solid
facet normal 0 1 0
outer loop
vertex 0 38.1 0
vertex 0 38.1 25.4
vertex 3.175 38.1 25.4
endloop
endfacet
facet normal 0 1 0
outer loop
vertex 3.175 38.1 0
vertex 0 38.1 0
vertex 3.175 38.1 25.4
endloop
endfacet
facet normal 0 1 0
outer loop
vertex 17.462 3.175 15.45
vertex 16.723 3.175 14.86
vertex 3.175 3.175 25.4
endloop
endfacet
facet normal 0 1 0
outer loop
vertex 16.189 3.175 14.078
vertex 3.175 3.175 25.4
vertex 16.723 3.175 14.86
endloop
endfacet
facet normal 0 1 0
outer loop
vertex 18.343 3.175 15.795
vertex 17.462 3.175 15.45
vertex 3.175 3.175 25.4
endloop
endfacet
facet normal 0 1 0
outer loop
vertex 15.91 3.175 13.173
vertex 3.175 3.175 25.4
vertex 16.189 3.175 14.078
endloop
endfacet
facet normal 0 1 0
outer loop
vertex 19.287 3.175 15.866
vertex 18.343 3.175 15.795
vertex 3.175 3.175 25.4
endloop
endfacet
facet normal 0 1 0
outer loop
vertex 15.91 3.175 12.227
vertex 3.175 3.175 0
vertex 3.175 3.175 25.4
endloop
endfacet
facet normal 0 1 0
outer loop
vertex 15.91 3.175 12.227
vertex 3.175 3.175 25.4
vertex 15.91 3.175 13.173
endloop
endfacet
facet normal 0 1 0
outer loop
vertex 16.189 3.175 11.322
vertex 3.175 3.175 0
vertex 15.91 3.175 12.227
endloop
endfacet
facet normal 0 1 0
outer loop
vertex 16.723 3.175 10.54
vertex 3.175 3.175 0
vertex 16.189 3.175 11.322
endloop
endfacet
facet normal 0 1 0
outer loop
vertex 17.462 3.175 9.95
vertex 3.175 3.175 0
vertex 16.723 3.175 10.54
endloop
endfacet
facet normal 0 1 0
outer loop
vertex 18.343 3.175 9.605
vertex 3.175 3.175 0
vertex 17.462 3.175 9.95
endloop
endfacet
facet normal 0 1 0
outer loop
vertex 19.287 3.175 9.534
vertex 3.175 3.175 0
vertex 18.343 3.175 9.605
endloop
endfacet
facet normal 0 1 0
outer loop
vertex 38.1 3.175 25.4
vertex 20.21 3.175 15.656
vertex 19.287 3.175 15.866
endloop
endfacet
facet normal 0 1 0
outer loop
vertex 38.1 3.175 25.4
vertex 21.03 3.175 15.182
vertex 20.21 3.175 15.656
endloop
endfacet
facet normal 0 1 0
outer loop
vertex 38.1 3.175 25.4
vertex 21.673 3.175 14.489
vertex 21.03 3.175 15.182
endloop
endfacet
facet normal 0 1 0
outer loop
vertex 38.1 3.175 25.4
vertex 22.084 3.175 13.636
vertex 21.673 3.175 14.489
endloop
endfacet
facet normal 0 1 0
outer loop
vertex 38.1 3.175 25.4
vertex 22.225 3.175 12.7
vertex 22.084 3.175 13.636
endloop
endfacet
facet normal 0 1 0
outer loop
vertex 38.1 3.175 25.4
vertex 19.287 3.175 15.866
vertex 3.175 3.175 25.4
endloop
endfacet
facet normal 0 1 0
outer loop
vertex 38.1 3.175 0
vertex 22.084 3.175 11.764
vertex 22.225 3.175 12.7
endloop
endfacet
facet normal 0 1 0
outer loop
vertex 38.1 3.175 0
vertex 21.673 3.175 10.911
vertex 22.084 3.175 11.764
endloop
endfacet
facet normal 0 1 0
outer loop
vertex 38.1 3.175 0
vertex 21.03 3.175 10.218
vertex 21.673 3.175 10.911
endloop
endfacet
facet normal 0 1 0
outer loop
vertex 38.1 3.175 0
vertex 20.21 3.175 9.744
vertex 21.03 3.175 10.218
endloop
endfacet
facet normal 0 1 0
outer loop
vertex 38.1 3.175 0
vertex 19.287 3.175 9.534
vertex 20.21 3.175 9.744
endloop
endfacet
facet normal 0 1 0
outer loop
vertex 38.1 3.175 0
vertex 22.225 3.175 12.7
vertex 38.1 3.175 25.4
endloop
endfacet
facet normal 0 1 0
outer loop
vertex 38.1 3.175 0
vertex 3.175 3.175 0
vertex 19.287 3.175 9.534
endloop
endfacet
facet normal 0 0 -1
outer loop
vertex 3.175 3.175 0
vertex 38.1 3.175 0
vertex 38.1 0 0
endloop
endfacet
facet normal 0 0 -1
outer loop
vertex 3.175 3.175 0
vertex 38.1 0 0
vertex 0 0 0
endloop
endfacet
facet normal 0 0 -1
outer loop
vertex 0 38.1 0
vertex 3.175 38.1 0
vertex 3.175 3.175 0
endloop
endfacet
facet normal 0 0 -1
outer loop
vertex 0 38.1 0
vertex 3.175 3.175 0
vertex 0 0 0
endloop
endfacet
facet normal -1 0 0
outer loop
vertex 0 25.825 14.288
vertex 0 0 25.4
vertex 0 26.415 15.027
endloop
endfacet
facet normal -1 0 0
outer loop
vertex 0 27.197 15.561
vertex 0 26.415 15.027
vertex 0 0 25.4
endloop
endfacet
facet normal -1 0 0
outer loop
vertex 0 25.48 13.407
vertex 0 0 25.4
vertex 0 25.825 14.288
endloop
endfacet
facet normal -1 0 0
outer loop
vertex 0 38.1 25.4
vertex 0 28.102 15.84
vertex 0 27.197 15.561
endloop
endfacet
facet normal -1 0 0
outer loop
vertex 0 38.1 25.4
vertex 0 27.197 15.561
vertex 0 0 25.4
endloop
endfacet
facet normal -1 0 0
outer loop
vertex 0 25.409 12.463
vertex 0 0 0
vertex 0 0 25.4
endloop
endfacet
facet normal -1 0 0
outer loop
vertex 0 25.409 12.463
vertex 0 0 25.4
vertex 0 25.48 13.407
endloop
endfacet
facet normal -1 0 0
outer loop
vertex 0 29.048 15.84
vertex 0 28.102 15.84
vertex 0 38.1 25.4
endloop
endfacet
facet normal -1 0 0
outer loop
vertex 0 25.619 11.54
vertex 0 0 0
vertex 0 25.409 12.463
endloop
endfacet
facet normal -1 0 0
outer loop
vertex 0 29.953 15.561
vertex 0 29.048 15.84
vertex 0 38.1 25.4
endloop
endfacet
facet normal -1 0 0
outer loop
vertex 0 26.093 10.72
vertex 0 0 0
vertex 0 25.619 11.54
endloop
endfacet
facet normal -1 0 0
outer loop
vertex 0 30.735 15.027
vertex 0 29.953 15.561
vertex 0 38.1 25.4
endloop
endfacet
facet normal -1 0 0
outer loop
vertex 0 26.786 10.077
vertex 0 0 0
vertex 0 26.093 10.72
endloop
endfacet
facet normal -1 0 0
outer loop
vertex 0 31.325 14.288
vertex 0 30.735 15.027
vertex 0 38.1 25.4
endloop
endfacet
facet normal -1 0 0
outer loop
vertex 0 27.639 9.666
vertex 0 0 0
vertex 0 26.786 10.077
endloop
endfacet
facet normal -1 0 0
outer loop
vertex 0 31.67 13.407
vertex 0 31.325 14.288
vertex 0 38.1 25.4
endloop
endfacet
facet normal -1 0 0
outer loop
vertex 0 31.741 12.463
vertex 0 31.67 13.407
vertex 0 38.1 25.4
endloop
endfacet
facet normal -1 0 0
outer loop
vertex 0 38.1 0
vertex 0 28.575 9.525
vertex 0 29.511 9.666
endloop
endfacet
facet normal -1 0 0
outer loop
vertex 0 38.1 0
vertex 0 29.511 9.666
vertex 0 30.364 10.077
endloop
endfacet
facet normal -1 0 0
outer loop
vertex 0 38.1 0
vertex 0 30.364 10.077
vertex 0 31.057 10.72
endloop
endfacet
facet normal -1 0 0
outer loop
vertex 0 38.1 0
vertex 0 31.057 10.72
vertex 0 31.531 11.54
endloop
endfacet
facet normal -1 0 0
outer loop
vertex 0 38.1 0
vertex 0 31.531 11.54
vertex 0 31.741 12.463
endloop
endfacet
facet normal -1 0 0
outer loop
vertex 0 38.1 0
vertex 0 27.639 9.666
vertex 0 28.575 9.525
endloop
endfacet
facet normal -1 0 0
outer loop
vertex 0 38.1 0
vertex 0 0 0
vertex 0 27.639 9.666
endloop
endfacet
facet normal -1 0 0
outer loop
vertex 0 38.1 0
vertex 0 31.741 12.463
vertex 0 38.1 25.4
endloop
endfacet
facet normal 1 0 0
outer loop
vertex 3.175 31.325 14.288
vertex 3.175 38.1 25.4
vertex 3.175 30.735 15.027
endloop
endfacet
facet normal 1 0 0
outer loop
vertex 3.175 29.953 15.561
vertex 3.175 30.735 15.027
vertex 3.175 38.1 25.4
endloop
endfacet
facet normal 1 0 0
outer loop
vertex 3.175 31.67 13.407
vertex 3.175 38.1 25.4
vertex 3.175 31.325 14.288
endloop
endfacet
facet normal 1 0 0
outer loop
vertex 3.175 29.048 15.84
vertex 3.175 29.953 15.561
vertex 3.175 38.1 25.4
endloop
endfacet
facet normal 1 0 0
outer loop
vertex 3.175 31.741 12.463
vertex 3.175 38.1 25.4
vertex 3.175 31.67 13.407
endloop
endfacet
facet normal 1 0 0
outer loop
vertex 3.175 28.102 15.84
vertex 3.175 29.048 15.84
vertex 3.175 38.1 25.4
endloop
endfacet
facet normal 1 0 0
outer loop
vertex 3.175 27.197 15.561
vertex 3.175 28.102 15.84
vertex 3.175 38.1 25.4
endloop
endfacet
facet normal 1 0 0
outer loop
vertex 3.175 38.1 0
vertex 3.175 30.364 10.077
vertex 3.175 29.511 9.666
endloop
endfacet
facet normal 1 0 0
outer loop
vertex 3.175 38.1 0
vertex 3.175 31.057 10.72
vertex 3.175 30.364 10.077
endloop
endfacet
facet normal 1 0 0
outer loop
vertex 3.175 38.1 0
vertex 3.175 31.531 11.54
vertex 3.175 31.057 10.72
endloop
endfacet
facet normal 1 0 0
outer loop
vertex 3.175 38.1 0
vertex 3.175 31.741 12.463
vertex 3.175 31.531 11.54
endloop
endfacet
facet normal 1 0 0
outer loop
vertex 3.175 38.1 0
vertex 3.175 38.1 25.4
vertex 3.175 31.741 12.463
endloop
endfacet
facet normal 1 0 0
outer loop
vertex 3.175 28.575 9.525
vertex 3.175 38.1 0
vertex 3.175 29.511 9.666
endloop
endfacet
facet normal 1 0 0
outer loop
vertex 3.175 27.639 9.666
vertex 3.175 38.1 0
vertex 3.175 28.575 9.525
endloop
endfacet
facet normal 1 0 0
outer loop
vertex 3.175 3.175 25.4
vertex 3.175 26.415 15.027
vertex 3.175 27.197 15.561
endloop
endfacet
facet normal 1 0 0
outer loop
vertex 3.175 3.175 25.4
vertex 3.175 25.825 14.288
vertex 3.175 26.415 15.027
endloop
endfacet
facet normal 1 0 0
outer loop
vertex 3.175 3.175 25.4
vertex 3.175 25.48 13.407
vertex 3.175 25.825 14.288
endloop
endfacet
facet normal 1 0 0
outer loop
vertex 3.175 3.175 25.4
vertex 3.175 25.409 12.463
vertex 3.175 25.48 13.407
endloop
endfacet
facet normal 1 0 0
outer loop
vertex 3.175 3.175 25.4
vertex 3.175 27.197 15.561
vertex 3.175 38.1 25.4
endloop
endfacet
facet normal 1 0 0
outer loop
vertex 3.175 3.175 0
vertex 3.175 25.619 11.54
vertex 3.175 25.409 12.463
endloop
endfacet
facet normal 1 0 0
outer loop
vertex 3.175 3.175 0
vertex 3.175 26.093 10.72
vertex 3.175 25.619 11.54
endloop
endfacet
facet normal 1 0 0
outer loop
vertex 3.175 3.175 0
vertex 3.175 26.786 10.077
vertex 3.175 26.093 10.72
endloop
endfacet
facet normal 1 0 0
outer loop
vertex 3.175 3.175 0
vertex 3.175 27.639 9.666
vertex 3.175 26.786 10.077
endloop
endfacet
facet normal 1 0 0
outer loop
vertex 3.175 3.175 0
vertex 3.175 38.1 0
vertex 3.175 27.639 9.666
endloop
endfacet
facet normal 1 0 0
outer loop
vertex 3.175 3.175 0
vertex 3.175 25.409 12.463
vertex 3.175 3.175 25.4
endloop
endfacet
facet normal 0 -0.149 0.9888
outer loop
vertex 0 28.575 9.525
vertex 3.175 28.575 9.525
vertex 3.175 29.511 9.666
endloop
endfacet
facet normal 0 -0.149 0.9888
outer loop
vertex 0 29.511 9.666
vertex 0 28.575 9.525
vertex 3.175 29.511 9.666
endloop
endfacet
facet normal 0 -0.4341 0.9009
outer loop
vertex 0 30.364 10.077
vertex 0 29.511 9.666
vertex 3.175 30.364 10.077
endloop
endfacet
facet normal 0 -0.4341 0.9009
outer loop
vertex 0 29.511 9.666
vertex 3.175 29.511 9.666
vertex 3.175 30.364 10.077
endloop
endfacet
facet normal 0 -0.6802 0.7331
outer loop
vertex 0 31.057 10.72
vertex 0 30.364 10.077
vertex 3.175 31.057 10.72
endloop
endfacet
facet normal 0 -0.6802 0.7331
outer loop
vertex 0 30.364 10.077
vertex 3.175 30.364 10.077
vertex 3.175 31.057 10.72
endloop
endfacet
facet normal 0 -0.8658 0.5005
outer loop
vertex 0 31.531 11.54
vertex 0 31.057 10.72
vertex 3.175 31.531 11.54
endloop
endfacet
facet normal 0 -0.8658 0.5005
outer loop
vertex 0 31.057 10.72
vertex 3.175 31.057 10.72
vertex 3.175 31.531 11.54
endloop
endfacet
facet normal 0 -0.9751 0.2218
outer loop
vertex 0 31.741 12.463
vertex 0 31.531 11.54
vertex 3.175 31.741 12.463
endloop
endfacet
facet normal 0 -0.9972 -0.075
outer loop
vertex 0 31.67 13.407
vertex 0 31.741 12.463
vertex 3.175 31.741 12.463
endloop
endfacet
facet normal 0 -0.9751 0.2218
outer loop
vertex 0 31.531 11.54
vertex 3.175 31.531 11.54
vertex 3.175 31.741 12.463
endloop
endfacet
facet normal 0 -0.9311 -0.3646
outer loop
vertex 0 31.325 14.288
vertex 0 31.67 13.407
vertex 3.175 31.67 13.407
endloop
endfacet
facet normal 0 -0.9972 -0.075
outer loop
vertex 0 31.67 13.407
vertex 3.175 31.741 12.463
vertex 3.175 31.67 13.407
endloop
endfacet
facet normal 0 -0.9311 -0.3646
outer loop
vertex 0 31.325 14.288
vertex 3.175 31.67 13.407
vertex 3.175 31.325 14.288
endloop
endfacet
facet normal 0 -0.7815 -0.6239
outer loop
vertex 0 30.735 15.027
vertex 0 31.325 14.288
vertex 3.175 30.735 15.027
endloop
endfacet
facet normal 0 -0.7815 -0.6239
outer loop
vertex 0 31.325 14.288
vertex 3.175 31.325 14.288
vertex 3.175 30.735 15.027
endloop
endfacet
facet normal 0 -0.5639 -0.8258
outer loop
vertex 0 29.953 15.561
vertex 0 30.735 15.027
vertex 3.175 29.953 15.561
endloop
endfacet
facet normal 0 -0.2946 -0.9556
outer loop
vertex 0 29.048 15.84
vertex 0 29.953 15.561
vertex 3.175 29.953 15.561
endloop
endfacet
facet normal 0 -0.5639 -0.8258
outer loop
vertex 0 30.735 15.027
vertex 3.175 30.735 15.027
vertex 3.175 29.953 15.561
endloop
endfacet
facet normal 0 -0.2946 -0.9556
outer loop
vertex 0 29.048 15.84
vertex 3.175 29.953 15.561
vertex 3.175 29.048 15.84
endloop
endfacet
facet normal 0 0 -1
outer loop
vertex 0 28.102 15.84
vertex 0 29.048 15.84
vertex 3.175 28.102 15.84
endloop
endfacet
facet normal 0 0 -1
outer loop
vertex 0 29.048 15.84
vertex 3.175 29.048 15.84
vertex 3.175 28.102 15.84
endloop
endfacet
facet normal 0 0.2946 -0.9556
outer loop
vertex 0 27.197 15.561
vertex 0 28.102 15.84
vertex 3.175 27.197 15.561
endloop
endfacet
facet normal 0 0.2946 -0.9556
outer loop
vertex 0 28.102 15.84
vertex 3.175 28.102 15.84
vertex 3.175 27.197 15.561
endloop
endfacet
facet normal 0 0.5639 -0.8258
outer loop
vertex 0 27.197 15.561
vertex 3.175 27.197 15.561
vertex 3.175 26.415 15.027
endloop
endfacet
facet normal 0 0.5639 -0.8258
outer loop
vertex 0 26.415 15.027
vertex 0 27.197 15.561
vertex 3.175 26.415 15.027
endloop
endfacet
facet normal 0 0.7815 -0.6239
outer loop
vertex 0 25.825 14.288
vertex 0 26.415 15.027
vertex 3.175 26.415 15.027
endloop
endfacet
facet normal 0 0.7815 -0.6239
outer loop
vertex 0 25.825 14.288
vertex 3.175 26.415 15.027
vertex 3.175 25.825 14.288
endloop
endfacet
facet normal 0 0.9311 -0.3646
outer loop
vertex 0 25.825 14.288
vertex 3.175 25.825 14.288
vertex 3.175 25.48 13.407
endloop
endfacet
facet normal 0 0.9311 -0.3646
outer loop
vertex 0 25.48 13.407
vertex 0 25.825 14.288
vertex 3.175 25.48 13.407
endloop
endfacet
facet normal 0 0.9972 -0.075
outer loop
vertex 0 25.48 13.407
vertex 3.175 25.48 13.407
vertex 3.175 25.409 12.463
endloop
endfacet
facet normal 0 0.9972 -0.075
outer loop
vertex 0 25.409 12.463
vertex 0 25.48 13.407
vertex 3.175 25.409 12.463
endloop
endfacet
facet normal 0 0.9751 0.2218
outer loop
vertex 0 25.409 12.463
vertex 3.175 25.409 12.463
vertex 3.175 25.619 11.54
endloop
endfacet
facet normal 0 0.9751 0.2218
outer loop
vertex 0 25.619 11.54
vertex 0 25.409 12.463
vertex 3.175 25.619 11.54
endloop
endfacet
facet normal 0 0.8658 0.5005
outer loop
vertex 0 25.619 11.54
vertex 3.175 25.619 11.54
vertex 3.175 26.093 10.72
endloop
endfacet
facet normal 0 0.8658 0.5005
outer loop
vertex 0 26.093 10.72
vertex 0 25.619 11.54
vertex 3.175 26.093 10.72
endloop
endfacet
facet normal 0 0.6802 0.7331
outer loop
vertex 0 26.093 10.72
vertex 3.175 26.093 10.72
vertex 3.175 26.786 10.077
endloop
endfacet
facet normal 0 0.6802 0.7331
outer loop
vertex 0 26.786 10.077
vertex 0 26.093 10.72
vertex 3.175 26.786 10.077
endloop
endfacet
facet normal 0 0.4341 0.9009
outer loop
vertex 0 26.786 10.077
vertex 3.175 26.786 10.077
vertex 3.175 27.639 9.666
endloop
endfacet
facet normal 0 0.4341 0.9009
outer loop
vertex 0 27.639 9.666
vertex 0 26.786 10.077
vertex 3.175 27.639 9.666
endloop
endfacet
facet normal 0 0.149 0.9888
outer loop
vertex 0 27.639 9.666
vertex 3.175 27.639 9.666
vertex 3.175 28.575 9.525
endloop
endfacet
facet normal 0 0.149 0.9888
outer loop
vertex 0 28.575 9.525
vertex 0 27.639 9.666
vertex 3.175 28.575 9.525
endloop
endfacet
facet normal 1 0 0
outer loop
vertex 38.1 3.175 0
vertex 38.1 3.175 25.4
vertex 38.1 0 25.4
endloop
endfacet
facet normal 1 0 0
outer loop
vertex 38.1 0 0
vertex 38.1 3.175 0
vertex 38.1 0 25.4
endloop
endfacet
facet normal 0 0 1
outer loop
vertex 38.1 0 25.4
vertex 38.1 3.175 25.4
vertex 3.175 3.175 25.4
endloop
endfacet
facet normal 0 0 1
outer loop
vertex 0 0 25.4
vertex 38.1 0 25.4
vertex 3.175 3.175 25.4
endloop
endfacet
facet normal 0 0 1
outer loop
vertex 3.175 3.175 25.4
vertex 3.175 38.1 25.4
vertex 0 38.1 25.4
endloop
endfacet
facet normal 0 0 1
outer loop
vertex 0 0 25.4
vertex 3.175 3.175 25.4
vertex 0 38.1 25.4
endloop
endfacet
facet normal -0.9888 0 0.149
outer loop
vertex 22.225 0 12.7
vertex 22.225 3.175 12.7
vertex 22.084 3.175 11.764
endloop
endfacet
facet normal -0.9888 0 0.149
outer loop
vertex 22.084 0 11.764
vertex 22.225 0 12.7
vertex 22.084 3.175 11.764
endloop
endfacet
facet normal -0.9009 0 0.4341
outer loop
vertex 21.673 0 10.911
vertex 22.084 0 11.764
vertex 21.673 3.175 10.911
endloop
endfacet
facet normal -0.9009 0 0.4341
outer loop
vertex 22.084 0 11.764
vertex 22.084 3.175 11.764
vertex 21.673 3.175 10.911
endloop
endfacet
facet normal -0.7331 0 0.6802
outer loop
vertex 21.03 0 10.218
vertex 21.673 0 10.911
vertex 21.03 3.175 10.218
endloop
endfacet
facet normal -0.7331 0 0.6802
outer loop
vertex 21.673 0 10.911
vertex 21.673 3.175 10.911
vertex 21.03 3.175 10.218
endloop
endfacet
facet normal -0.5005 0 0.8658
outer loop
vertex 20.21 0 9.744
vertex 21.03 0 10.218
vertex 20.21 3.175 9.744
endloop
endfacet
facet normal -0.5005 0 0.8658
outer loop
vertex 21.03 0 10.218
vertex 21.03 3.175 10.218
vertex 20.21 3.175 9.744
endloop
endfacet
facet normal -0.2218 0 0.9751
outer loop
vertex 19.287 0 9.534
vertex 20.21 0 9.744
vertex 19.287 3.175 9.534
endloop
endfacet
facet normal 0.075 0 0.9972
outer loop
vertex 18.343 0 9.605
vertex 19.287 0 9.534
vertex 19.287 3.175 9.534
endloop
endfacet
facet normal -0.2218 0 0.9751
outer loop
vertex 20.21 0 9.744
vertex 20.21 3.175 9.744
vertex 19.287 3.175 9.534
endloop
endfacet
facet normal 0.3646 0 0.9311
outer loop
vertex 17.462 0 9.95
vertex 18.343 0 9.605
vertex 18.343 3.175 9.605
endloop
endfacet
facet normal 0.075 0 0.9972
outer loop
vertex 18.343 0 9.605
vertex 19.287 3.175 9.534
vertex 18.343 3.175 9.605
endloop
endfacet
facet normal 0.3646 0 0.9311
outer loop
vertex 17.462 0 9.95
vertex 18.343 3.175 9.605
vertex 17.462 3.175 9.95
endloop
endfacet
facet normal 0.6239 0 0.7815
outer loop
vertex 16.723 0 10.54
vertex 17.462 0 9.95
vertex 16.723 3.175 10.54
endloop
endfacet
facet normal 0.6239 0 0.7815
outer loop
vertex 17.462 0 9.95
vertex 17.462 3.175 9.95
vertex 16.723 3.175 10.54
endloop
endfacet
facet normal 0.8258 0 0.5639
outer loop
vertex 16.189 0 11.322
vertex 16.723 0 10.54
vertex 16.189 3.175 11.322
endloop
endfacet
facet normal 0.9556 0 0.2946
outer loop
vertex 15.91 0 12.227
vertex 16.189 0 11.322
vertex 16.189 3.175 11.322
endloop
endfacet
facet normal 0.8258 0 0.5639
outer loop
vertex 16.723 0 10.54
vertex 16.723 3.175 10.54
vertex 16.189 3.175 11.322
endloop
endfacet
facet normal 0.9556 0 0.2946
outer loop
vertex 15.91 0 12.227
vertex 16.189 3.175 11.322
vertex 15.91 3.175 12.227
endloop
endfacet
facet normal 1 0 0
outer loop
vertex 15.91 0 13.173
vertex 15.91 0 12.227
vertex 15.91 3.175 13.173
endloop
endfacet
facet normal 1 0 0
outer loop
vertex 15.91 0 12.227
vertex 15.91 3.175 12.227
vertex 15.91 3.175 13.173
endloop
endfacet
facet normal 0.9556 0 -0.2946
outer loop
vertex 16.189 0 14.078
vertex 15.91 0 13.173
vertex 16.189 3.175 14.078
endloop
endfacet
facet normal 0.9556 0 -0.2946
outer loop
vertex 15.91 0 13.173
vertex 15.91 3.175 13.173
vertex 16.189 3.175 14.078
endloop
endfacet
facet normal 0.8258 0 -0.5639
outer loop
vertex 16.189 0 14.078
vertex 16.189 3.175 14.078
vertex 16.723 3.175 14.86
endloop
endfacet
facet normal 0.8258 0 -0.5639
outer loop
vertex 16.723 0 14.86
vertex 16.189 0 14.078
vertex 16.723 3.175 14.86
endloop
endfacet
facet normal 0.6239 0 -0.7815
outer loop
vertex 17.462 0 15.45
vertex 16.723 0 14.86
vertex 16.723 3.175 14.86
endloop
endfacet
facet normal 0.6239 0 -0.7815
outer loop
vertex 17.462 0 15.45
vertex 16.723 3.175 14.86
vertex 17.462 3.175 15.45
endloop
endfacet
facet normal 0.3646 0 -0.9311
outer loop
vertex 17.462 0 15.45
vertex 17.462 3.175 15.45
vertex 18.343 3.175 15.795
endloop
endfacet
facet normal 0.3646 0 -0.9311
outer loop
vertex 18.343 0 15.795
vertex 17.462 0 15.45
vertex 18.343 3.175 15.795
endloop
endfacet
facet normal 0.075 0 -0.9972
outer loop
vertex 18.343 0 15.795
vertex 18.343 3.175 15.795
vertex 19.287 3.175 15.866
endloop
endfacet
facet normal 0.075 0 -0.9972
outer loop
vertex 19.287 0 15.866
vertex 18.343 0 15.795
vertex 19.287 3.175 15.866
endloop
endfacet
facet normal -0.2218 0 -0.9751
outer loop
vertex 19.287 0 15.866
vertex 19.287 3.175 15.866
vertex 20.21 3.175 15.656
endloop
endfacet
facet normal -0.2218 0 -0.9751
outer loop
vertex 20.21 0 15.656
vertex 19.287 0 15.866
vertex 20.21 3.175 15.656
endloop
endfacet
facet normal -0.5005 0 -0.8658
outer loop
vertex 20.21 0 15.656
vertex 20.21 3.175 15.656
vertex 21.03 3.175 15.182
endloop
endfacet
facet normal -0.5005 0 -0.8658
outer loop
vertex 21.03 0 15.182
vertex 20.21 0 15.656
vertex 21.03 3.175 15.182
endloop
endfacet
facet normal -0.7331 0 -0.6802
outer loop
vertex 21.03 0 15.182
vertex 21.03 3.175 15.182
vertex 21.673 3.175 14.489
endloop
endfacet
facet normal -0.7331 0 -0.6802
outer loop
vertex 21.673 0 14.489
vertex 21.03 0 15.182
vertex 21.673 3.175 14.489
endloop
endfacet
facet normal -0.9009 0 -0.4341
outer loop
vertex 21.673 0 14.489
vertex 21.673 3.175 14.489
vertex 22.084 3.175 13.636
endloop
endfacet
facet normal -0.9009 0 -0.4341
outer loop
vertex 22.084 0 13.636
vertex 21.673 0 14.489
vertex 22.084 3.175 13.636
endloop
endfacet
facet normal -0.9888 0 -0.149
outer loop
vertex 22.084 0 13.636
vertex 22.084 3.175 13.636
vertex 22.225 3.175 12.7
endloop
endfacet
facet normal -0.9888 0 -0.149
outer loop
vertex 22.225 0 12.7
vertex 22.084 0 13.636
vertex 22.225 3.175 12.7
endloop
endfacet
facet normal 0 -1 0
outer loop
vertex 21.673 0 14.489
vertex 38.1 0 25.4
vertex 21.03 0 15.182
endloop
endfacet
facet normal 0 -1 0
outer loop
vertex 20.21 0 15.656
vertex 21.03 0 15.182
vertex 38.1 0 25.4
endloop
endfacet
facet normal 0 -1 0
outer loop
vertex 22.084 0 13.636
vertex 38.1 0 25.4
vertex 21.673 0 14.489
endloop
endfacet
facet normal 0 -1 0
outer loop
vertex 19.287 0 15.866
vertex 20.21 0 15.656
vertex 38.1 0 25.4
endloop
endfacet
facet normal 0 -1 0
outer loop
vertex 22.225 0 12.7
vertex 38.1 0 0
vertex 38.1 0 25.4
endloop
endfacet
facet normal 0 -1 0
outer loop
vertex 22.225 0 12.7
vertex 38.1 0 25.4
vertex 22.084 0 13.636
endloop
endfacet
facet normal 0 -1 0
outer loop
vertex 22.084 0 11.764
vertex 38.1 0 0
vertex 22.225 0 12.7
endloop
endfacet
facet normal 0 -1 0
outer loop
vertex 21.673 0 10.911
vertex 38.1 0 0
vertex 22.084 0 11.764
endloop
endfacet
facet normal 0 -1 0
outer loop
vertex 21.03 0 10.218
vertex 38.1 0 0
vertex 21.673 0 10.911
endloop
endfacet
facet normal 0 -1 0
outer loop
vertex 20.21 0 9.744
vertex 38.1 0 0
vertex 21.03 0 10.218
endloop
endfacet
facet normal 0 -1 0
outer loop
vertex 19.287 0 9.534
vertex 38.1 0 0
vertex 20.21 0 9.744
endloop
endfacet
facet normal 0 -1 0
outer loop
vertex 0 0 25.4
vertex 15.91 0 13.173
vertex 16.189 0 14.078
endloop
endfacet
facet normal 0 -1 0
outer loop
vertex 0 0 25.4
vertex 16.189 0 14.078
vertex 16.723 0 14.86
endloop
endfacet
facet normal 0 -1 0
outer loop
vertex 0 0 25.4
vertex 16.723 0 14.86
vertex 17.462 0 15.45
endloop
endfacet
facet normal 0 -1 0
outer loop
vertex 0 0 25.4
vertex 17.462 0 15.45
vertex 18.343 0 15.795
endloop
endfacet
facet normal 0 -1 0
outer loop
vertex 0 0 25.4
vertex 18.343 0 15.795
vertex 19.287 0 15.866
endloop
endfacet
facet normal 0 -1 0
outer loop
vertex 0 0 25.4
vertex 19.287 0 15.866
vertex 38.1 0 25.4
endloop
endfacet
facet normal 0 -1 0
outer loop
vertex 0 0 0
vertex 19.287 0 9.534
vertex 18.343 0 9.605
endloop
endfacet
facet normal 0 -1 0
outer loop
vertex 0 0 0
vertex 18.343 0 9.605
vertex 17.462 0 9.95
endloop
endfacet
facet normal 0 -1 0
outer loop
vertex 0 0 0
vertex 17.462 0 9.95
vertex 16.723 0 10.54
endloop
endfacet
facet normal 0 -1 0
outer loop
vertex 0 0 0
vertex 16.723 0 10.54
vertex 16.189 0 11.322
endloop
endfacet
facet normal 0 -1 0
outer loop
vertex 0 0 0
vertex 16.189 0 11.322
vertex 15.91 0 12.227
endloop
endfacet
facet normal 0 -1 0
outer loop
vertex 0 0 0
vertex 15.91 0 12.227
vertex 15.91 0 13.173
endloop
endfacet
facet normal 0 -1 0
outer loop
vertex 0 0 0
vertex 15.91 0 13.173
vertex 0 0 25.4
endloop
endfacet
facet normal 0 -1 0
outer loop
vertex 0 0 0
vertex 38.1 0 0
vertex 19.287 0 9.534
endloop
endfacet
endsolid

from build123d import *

# Parameters (mm, degrees)
BOSS_EXTRUDE1_DEPTH = 25.4
SKETCH2_R           = 3.175
CUT_EXTRUDE1_DEPTH  = 4.175
SKETCH3_R           = 3.175
CUT_EXTRUDE2_DEPTH  = 4.175


with BuildPart() as part:
    # Sketch1 → Boss-Extrude1 (new body)
    with BuildSketch(Plane.XY):
        Polygon((0, 0), (0, 38.1), (3.175, 38.1), (3.175, 3.175), (38.1, 3.175), (38.1, 0), align=None)
    extrude(amount=BOSS_EXTRUDE1_DEPTH)

    # Sketch2 → Cut-Extrude1 (cut, through all)
    with BuildSketch(Plane(origin=(0, 3.175, 0), x_dir=(1, 0, 0), z_dir=(0, 1, 0))):
        with Locations((19.05, -12.7)):
            Circle(SKETCH2_R)
    extrude(amount=-CUT_EXTRUDE1_DEPTH, mode=Mode.SUBTRACT)

    # Sketch3 → Cut-Extrude2 (cut, through all)
    with BuildSketch(Plane(origin=(3.175, 0, 0), x_dir=(0, 0, -1), z_dir=(1, 0, 0))):
        with Locations((-12.7, 28.575)):
            Circle(SKETCH3_R)
    extrude(amount=-CUT_EXTRUDE2_DEPTH, mode=Mode.SUBTRACT)


solid = part.part
